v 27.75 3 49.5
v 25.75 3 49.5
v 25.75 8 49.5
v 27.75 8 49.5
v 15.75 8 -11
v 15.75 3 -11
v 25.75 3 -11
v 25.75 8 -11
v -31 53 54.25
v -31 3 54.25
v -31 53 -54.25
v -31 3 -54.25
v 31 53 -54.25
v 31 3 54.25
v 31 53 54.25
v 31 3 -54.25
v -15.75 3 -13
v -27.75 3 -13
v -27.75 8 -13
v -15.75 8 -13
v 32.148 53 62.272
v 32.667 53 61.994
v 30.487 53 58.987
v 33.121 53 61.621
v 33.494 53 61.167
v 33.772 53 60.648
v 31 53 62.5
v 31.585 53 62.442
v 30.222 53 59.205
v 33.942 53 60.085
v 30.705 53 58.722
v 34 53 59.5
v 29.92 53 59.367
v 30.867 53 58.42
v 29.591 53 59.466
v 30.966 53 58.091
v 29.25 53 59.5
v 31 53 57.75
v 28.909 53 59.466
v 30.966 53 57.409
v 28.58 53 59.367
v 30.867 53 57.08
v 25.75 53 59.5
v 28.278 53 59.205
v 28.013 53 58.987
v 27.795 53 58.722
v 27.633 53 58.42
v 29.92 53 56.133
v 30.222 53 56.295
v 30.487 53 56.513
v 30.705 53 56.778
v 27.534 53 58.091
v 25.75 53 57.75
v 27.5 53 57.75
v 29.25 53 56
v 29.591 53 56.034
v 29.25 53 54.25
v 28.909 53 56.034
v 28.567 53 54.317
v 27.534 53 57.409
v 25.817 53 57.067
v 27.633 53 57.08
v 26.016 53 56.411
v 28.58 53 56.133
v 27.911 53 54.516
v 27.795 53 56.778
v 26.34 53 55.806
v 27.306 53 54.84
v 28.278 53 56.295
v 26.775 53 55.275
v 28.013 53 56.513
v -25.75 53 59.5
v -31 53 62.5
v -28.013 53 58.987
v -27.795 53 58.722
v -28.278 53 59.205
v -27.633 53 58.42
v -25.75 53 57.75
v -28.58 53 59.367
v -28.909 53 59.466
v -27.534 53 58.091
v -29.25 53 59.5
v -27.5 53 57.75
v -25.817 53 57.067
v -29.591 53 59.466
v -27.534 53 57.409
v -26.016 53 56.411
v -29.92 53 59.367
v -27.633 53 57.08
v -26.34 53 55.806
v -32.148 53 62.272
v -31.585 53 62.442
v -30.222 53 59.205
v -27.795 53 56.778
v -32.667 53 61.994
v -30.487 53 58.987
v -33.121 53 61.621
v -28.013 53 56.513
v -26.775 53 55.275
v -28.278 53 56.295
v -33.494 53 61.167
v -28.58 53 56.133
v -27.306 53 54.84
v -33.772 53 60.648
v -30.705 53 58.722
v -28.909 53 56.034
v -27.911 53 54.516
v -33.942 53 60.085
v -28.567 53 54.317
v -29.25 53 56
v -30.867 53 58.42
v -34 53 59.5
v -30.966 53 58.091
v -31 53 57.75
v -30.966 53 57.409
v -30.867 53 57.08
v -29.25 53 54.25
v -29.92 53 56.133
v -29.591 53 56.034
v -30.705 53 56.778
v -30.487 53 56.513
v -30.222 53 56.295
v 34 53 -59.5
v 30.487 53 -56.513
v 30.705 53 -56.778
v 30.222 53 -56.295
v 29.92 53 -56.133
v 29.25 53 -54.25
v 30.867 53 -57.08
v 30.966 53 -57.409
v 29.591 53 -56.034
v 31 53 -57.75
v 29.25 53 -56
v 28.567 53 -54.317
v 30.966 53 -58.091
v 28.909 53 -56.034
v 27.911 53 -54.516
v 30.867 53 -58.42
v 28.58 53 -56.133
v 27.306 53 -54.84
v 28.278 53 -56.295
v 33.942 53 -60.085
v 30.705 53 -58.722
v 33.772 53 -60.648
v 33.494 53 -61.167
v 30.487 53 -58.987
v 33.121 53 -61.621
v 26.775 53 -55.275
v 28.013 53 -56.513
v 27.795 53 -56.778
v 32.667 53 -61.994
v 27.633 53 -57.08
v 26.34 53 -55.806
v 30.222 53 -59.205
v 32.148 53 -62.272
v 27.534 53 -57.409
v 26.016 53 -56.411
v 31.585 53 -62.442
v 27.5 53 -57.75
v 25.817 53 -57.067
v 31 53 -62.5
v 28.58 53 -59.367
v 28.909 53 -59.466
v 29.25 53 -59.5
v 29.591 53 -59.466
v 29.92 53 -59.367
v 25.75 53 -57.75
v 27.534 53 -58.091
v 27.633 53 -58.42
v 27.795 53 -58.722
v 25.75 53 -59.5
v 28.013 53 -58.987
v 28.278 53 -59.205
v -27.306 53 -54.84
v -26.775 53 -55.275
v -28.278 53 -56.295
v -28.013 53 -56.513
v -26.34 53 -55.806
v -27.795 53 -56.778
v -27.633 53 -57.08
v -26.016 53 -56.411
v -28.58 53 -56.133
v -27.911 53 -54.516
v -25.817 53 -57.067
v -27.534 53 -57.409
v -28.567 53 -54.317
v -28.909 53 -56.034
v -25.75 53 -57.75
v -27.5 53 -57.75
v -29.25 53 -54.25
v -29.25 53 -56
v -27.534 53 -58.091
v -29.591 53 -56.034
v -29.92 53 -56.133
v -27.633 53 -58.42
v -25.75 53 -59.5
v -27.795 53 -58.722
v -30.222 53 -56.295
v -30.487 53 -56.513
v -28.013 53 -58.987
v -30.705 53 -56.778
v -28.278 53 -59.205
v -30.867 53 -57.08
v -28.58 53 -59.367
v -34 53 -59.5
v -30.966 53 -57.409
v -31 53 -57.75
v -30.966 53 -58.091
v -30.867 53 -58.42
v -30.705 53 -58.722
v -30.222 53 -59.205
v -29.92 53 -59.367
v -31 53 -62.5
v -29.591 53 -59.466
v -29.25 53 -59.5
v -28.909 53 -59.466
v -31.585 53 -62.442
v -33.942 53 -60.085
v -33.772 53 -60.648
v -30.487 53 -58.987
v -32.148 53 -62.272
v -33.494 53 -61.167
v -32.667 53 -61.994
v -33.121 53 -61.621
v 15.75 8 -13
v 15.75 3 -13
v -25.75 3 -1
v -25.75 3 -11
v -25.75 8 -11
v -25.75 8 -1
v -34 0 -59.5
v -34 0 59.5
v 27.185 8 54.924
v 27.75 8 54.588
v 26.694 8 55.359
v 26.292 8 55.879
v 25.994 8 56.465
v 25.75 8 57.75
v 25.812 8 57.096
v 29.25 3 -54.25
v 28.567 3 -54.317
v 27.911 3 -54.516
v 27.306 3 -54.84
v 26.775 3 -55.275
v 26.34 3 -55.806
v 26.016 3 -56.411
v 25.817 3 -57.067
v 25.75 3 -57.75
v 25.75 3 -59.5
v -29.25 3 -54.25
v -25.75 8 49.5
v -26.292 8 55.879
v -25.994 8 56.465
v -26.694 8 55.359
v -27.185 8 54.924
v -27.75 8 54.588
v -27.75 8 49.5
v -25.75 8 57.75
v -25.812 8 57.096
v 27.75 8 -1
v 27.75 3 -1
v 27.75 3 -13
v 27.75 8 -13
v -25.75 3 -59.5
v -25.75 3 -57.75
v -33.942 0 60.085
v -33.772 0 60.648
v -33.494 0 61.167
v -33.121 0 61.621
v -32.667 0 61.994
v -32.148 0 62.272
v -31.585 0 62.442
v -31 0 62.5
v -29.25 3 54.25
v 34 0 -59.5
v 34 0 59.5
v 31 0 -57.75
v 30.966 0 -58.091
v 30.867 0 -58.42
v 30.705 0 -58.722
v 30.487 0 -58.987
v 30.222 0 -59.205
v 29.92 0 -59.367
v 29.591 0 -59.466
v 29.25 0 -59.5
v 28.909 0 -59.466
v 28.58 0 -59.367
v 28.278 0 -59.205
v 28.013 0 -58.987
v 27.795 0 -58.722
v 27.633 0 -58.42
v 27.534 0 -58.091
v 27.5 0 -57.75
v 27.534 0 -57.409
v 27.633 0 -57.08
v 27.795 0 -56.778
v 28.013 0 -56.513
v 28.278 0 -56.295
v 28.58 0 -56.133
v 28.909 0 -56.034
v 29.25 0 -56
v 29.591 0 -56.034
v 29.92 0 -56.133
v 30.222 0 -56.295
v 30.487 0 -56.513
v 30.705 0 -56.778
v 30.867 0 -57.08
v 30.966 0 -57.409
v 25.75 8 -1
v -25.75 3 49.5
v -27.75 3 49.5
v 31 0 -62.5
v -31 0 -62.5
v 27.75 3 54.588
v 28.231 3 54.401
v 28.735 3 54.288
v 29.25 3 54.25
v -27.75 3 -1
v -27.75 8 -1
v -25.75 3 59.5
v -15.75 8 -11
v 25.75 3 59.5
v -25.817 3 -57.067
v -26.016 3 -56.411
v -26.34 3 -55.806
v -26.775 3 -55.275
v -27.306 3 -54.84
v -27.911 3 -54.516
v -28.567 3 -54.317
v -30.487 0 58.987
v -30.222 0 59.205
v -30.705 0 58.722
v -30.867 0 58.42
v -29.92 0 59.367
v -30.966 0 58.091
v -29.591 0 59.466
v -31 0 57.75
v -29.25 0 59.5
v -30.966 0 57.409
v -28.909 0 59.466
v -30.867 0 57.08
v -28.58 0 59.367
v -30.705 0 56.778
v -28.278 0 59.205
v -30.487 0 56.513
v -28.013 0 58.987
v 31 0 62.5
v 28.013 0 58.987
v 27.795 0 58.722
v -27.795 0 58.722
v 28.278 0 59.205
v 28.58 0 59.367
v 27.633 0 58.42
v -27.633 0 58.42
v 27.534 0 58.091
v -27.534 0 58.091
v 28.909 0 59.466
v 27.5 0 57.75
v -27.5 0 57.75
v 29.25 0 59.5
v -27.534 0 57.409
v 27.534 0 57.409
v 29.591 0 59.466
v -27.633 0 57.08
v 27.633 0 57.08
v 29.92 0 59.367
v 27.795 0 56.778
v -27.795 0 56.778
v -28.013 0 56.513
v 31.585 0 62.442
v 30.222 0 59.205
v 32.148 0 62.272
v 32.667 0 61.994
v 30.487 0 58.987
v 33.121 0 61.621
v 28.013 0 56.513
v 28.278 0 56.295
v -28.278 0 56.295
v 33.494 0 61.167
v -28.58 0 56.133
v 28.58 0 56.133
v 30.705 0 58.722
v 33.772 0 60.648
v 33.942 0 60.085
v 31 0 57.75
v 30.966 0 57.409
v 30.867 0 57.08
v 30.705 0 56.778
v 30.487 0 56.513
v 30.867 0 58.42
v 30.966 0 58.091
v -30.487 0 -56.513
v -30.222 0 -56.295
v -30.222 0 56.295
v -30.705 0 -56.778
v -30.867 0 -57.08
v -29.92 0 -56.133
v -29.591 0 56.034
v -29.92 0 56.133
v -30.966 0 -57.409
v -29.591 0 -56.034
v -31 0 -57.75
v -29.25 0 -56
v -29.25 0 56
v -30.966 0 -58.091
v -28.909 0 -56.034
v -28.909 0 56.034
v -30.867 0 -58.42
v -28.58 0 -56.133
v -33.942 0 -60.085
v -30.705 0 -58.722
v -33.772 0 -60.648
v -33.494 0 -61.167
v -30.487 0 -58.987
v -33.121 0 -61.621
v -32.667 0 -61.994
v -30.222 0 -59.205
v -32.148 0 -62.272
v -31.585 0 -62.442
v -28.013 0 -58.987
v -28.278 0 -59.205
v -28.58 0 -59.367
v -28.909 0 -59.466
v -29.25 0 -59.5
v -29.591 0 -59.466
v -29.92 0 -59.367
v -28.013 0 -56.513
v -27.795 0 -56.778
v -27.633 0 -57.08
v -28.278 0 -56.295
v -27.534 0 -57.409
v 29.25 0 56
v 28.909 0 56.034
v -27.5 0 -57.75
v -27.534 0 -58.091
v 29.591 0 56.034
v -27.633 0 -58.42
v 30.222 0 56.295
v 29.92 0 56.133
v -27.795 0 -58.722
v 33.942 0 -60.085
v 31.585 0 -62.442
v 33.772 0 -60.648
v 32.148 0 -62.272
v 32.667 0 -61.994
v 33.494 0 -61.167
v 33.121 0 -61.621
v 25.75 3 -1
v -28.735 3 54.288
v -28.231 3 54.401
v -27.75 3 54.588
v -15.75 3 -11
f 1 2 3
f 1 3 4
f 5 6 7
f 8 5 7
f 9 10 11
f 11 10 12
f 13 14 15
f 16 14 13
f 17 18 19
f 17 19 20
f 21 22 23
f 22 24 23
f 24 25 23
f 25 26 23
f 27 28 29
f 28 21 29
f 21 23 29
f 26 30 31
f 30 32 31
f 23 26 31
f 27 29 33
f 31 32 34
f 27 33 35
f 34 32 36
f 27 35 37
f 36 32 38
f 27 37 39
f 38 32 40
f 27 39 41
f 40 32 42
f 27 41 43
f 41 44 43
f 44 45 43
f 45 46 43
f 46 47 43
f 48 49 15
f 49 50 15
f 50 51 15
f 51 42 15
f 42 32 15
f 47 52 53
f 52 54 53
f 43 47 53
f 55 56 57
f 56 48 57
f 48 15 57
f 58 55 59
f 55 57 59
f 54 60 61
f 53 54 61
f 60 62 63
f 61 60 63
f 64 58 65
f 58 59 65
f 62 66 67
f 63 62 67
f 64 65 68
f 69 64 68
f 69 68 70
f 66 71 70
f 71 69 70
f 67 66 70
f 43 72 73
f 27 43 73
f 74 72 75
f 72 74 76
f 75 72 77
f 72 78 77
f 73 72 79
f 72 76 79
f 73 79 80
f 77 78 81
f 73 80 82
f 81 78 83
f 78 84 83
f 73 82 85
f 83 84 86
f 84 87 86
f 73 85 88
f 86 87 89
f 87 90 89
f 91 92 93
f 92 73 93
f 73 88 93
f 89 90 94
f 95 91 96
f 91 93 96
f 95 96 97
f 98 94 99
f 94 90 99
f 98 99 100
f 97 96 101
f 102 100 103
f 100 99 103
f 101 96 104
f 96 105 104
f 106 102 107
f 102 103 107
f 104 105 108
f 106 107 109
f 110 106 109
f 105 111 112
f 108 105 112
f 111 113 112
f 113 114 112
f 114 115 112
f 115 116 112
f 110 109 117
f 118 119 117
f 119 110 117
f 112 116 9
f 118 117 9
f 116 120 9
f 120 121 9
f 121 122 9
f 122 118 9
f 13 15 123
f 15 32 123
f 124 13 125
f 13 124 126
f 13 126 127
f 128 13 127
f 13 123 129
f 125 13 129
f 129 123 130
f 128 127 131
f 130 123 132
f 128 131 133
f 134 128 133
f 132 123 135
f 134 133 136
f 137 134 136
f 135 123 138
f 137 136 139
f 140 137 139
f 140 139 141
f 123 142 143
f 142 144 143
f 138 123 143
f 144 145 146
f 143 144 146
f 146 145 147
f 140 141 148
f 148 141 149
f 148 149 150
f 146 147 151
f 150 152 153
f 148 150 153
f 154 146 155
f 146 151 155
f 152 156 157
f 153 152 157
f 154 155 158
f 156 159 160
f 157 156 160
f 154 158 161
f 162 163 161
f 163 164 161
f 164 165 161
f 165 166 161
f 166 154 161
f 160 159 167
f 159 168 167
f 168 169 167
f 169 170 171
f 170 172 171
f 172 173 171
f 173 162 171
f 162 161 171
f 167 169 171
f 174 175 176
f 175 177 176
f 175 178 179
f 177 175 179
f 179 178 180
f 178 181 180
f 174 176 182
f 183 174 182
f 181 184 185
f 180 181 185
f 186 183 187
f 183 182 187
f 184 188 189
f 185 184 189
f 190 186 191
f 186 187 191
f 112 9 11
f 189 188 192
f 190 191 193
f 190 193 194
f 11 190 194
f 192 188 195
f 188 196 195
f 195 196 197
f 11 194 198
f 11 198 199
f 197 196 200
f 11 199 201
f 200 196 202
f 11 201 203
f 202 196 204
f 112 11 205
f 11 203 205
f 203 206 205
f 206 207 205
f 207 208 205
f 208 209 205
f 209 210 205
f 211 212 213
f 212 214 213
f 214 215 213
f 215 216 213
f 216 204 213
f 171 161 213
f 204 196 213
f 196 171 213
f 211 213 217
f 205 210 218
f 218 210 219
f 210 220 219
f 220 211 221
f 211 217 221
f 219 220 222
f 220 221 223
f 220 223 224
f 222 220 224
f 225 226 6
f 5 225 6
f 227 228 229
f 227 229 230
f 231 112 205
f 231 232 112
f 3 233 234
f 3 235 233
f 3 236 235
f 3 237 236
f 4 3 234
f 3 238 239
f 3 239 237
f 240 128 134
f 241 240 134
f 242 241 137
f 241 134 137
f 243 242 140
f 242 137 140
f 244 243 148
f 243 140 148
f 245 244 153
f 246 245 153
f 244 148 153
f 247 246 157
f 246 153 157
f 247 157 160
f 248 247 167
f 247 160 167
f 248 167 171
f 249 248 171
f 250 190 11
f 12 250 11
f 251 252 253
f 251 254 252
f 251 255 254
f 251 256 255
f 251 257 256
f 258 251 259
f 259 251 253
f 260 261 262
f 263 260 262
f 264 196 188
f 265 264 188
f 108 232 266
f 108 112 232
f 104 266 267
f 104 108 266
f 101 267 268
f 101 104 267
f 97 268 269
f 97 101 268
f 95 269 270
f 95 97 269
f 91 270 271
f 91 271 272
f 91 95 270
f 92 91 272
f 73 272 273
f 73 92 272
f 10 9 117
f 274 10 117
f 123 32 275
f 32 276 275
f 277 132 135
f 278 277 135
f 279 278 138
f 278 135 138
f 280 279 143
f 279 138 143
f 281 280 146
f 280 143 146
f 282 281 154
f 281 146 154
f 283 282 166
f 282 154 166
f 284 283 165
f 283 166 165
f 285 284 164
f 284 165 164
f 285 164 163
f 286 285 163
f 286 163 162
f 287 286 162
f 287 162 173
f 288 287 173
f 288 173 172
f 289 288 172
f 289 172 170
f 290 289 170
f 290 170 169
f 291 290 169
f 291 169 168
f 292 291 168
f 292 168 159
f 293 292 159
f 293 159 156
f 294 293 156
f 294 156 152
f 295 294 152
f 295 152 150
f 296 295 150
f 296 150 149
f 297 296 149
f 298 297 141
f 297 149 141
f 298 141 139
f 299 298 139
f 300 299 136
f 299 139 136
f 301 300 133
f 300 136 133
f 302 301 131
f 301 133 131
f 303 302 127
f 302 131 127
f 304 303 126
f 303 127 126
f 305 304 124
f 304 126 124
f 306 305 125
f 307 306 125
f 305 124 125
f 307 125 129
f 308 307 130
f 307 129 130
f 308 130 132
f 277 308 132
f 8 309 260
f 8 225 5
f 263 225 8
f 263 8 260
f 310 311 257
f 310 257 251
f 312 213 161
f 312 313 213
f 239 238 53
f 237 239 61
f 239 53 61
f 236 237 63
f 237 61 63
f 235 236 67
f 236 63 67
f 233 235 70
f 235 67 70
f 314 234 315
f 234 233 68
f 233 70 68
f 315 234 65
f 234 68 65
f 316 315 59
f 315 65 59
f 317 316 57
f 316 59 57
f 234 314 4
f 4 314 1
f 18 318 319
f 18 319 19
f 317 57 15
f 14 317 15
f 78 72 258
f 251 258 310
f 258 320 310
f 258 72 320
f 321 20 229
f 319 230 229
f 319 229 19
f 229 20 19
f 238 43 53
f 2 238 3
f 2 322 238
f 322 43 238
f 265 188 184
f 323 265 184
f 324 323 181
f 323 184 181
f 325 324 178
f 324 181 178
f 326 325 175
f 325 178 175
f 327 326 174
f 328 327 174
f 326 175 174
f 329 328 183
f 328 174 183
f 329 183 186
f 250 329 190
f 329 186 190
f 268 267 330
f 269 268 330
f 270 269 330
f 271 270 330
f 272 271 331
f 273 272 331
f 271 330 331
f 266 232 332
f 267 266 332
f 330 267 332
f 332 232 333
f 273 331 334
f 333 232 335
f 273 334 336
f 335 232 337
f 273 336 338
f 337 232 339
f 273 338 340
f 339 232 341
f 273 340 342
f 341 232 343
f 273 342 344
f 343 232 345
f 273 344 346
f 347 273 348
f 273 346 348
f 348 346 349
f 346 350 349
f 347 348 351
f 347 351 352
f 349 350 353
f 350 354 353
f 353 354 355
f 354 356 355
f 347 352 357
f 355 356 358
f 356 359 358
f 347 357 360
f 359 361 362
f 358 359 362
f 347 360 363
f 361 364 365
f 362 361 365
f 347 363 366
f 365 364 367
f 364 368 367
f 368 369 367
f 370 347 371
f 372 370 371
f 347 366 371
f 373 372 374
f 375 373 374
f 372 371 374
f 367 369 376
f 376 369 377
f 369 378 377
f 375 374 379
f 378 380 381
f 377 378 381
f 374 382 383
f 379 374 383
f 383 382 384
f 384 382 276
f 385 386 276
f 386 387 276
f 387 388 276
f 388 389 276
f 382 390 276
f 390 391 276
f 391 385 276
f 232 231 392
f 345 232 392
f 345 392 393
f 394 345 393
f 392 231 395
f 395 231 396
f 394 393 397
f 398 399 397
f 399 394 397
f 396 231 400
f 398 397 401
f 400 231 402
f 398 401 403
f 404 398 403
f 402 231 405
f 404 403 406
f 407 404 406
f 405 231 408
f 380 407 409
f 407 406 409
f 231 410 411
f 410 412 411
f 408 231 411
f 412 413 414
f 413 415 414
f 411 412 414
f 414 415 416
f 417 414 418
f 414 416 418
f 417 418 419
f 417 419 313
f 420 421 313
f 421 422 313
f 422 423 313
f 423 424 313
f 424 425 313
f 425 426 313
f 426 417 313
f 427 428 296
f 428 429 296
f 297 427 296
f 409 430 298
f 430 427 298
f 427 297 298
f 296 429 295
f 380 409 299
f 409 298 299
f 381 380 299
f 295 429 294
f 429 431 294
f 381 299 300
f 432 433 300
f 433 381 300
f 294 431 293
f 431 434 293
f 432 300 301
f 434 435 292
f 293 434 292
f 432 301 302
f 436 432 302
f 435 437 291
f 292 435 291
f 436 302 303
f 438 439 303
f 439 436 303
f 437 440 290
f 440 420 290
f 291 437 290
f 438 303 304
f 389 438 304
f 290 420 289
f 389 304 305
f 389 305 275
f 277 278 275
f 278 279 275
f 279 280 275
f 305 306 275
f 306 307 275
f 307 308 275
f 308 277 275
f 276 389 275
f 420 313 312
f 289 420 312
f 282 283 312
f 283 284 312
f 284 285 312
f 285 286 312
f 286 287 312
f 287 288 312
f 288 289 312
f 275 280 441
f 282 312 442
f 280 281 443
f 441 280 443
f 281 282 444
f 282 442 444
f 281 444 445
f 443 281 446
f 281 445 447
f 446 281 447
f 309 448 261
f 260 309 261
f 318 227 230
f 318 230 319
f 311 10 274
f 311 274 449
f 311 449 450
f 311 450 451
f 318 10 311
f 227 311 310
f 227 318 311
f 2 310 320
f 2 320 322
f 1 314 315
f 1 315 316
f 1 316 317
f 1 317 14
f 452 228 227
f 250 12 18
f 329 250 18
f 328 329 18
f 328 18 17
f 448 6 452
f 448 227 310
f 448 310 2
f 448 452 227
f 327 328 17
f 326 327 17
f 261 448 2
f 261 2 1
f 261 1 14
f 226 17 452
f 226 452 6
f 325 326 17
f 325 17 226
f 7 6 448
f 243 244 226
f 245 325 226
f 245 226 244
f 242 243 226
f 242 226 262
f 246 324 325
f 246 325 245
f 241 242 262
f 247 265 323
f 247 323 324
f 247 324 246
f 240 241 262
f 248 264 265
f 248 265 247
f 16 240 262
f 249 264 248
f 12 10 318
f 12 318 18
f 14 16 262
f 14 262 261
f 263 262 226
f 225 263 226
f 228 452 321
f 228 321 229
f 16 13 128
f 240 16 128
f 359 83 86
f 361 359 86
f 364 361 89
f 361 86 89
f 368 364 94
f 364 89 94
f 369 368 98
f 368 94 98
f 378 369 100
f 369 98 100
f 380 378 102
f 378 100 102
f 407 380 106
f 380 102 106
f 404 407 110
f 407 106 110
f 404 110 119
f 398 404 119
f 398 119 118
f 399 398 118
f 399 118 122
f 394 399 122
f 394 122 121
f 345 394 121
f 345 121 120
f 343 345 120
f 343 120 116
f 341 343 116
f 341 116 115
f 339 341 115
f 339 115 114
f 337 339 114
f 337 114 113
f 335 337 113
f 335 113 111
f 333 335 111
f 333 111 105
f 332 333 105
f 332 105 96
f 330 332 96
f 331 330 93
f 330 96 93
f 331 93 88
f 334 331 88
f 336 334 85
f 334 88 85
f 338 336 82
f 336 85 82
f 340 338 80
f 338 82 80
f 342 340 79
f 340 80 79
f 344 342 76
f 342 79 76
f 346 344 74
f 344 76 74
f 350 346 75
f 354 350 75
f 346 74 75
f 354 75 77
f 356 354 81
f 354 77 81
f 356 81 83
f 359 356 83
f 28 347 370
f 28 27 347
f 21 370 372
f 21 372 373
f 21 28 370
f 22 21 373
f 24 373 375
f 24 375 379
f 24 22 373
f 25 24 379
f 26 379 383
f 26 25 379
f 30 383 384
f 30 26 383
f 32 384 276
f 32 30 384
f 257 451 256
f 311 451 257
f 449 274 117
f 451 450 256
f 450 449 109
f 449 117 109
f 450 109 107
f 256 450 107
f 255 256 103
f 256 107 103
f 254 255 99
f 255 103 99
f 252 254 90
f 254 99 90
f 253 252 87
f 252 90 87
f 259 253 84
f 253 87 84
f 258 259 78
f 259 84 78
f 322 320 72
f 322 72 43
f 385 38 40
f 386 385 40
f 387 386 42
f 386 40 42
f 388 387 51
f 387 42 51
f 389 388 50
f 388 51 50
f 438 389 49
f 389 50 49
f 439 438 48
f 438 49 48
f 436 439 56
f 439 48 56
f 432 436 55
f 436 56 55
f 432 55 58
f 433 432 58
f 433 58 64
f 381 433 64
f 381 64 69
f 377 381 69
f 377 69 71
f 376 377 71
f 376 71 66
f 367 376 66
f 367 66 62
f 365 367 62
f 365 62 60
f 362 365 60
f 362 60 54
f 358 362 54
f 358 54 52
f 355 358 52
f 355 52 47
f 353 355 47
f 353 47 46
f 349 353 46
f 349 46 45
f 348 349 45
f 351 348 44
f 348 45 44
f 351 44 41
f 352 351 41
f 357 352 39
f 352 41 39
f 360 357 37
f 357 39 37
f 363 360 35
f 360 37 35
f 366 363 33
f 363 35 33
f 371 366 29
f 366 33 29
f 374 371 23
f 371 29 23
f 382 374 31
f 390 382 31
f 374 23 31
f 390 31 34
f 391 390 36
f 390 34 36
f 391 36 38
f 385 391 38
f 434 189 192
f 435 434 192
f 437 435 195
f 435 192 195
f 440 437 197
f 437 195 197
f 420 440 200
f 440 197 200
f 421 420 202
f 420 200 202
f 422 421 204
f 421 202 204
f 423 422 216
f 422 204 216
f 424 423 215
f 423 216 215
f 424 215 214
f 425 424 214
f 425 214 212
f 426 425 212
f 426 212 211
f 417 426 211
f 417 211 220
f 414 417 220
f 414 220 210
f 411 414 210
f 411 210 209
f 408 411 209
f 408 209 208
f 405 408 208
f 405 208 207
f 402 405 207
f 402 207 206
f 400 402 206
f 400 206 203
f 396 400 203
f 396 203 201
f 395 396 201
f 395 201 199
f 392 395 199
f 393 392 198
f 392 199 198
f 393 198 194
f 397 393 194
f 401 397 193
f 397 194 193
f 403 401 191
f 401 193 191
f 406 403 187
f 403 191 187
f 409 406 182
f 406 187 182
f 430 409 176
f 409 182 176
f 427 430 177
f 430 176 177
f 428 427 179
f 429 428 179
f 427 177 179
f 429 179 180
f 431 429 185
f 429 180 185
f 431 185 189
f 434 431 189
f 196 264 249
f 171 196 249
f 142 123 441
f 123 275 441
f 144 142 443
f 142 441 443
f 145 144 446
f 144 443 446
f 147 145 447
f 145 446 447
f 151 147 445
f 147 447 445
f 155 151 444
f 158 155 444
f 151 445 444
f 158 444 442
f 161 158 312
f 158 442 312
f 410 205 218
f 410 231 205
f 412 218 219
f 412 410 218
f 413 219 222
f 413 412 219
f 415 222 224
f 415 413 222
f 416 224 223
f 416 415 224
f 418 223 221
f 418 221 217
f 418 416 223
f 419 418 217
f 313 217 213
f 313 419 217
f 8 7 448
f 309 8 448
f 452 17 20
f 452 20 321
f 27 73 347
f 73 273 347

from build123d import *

# Parameters (mm, degrees)
SKETCH_1_W          = 68
SKETCH_1_H          = 125
EXTRUDE_1_DEPTH     = 3
SKETCH_3_W          = 68
SKETCH_3_H          = 125
SKETCH_3_W_2        = 62
SKETCH_3_H_2        = 119
EXTRUDE_1_2_DEPTH   = 50
FILLET_1_R          = 3
SKETCH_4_W          = 2
SKETCH_4_H          = 10
EXTRUDE_2_DEPTH     = 5
SKETCH_5_R          = 1.75
EXTRUDE_3_DEPTH     = 50
SKETCH_6_R          = 1.75
CUT_EXTRUDE_1_DEPTH = 54


with BuildPart() as part:
    # Эскиз1 → Extrude 1 (new body)
    with BuildSketch(Plane(origin=(0, 0, 0), x_dir=(1, 0, 0), z_dir=(0, 1, 0))):
        Rectangle(SKETCH_1_W, SKETCH_1_H)
    extrude(amount=EXTRUDE_1_DEPTH)

    # Эскиз3 → Extrude 1 2 (add)
    with BuildSketch(Plane(origin=(0, 3, 0), x_dir=(1, 0, 0), z_dir=(0, 1, 0))):
        Rectangle(SKETCH_3_W, SKETCH_3_H)
        Rectangle(SKETCH_3_W_2, SKETCH_3_H_2, mode=Mode.SUBTRACT)
    extrude(amount=EXTRUDE_1_2_DEPTH)

    # Скругление1
    fillet_1_edges = [part.edges().sort_by_distance(p)[0] for p in [
        (-34, 26.5, -62.5),
        (34, 26.5, -62.5),
        (34, 26.5, 62.5),
        (-34, 26.5, 62.5),
    ]]
    fillet(fillet_1_edges, radius=FILLET_1_R)

    # Эскиз4 → Бобышка-Вытянуть2 (add)
    with BuildSketch(Plane(origin=(0, 3, 0), x_dir=(1, 0, 0), z_dir=(0, 1, 0))):
        Polygon((15.75, 11), (25.75, 11), (25.75, 1), (27.75, 1), (27.75, 13), (15.75, 13), align=None)
        with Locations((26.75, -54.5)):
            Rectangle(SKETCH_4_W, SKETCH_4_H)
        with Locations((-26.75, -54.5)):
            Rectangle(SKETCH_4_W, SKETCH_4_H)
        Polygon((-27.75, 13), (-15.75, 13), (-15.75, 11), (-25.75, 11), (-25.75, 1), (-27.75, 1), align=None)
    extrude(amount=EXTRUDE_2_DEPTH)

    # Эскиз5 → Бобышка-Вытянуть3 (add)
    with BuildSketch(Plane(origin=(0, 53, 0), x_dir=(1, 0, 0), z_dir=(0, 1, 0))):
        with BuildLine():
            Line((-29.25, 54.25), (-32.75, 54.25))
            Line((-32.75, 54.25), (-32.75, 57.75))
            ThreePointArc((-32.75, 57.75), (-31.724873734, 60.224873734), (-29.25, 61.25))
            Line((-29.25, 61.25), (-25.75, 61.25))
            Line((-25.75, 61.25), (-25.75, 57.75))
            ThreePointArc((-25.75, 57.75), (-26.775126266, 55.275126266), (-29.25, 54.25))
        make_face()
        with Locations((-29.25, 57.75)):
            Circle(SKETCH_5_R, mode=Mode.SUBTRACT)
        with BuildLine():
            Line((25.75, 61.25), (29.25, 61.25))
            ThreePointArc((29.25, 61.25), (31.724873734, 60.224873734), (32.75, 57.75))
            Line((32.75, 57.75), (32.75, 54.25))
            Line((32.75, 54.25), (29.25, 54.25))
            ThreePointArc((29.25, 54.25), (26.775126266, 55.275126266), (25.75, 57.75))
            Line((25.75, 57.75), (25.75, 61.25))
        make_face()
        with Locations((29.25, 57.75)):
            Circle(SKETCH_5_R, mode=Mode.SUBTRACT)
        with BuildLine():
            Line((29.25, -54.25), (32.75, -54.25))
            Line((32.75, -54.25), (32.75, -57.75))
            ThreePointArc((32.75, -57.75), (31.724873734, -60.224873734), (29.25, -61.25))
            Line((29.25, -61.25), (25.75, -61.25))
            Line((25.75, -61.25), (25.75, -57.75))
            ThreePointArc((25.75, -57.75), (26.775126266, -55.275126266), (29.25, -54.25))
        make_face()
        with Locations((29.25, -57.75)):
            Circle(SKETCH_5_R, mode=Mode.SUBTRACT)
        with BuildLine():
            Line((-25.75, -61.25), (-29.25, -61.25))
            ThreePointArc((-29.25, -61.25), (-31.724873734, -60.224873734), (-32.75, -57.75))
            Line((-32.75, -57.75), (-32.75, -54.25))
            Line((-32.75, -54.25), (-29.25, -54.25))
            ThreePointArc((-29.25, -54.25), (-26.775126266, -55.275126266), (-25.75, -57.75))
            Line((-25.75, -57.75), (-25.75, -61.25))
        make_face()
        with Locations((-29.25, -57.75)):
            Circle(SKETCH_5_R, mode=Mode.SUBTRACT)
    extrude(amount=-EXTRUDE_3_DEPTH)

    # Эскиз6 → Вырез-Вытянуть1 (cut, through all)
    with BuildSketch(Plane(origin=(0, 53, 0), x_dir=(1, 0, 0), z_dir=(0, 1, 0))):
        with Locations((-29.25, 57.75)):
            Circle(SKETCH_6_R)
        with Locations((29.25, 57.75)):
            Circle(SKETCH_6_R)
        with Locations((29.25, -57.75)):
            Circle(SKETCH_6_R)
        with Locations((-29.25, -57.75)):
            Circle(SKETCH_6_R)
    extrude(amount=-CUT_EXTRUDE_1_DEPTH, mode=Mode.SUBTRACT)


solid = part.part
